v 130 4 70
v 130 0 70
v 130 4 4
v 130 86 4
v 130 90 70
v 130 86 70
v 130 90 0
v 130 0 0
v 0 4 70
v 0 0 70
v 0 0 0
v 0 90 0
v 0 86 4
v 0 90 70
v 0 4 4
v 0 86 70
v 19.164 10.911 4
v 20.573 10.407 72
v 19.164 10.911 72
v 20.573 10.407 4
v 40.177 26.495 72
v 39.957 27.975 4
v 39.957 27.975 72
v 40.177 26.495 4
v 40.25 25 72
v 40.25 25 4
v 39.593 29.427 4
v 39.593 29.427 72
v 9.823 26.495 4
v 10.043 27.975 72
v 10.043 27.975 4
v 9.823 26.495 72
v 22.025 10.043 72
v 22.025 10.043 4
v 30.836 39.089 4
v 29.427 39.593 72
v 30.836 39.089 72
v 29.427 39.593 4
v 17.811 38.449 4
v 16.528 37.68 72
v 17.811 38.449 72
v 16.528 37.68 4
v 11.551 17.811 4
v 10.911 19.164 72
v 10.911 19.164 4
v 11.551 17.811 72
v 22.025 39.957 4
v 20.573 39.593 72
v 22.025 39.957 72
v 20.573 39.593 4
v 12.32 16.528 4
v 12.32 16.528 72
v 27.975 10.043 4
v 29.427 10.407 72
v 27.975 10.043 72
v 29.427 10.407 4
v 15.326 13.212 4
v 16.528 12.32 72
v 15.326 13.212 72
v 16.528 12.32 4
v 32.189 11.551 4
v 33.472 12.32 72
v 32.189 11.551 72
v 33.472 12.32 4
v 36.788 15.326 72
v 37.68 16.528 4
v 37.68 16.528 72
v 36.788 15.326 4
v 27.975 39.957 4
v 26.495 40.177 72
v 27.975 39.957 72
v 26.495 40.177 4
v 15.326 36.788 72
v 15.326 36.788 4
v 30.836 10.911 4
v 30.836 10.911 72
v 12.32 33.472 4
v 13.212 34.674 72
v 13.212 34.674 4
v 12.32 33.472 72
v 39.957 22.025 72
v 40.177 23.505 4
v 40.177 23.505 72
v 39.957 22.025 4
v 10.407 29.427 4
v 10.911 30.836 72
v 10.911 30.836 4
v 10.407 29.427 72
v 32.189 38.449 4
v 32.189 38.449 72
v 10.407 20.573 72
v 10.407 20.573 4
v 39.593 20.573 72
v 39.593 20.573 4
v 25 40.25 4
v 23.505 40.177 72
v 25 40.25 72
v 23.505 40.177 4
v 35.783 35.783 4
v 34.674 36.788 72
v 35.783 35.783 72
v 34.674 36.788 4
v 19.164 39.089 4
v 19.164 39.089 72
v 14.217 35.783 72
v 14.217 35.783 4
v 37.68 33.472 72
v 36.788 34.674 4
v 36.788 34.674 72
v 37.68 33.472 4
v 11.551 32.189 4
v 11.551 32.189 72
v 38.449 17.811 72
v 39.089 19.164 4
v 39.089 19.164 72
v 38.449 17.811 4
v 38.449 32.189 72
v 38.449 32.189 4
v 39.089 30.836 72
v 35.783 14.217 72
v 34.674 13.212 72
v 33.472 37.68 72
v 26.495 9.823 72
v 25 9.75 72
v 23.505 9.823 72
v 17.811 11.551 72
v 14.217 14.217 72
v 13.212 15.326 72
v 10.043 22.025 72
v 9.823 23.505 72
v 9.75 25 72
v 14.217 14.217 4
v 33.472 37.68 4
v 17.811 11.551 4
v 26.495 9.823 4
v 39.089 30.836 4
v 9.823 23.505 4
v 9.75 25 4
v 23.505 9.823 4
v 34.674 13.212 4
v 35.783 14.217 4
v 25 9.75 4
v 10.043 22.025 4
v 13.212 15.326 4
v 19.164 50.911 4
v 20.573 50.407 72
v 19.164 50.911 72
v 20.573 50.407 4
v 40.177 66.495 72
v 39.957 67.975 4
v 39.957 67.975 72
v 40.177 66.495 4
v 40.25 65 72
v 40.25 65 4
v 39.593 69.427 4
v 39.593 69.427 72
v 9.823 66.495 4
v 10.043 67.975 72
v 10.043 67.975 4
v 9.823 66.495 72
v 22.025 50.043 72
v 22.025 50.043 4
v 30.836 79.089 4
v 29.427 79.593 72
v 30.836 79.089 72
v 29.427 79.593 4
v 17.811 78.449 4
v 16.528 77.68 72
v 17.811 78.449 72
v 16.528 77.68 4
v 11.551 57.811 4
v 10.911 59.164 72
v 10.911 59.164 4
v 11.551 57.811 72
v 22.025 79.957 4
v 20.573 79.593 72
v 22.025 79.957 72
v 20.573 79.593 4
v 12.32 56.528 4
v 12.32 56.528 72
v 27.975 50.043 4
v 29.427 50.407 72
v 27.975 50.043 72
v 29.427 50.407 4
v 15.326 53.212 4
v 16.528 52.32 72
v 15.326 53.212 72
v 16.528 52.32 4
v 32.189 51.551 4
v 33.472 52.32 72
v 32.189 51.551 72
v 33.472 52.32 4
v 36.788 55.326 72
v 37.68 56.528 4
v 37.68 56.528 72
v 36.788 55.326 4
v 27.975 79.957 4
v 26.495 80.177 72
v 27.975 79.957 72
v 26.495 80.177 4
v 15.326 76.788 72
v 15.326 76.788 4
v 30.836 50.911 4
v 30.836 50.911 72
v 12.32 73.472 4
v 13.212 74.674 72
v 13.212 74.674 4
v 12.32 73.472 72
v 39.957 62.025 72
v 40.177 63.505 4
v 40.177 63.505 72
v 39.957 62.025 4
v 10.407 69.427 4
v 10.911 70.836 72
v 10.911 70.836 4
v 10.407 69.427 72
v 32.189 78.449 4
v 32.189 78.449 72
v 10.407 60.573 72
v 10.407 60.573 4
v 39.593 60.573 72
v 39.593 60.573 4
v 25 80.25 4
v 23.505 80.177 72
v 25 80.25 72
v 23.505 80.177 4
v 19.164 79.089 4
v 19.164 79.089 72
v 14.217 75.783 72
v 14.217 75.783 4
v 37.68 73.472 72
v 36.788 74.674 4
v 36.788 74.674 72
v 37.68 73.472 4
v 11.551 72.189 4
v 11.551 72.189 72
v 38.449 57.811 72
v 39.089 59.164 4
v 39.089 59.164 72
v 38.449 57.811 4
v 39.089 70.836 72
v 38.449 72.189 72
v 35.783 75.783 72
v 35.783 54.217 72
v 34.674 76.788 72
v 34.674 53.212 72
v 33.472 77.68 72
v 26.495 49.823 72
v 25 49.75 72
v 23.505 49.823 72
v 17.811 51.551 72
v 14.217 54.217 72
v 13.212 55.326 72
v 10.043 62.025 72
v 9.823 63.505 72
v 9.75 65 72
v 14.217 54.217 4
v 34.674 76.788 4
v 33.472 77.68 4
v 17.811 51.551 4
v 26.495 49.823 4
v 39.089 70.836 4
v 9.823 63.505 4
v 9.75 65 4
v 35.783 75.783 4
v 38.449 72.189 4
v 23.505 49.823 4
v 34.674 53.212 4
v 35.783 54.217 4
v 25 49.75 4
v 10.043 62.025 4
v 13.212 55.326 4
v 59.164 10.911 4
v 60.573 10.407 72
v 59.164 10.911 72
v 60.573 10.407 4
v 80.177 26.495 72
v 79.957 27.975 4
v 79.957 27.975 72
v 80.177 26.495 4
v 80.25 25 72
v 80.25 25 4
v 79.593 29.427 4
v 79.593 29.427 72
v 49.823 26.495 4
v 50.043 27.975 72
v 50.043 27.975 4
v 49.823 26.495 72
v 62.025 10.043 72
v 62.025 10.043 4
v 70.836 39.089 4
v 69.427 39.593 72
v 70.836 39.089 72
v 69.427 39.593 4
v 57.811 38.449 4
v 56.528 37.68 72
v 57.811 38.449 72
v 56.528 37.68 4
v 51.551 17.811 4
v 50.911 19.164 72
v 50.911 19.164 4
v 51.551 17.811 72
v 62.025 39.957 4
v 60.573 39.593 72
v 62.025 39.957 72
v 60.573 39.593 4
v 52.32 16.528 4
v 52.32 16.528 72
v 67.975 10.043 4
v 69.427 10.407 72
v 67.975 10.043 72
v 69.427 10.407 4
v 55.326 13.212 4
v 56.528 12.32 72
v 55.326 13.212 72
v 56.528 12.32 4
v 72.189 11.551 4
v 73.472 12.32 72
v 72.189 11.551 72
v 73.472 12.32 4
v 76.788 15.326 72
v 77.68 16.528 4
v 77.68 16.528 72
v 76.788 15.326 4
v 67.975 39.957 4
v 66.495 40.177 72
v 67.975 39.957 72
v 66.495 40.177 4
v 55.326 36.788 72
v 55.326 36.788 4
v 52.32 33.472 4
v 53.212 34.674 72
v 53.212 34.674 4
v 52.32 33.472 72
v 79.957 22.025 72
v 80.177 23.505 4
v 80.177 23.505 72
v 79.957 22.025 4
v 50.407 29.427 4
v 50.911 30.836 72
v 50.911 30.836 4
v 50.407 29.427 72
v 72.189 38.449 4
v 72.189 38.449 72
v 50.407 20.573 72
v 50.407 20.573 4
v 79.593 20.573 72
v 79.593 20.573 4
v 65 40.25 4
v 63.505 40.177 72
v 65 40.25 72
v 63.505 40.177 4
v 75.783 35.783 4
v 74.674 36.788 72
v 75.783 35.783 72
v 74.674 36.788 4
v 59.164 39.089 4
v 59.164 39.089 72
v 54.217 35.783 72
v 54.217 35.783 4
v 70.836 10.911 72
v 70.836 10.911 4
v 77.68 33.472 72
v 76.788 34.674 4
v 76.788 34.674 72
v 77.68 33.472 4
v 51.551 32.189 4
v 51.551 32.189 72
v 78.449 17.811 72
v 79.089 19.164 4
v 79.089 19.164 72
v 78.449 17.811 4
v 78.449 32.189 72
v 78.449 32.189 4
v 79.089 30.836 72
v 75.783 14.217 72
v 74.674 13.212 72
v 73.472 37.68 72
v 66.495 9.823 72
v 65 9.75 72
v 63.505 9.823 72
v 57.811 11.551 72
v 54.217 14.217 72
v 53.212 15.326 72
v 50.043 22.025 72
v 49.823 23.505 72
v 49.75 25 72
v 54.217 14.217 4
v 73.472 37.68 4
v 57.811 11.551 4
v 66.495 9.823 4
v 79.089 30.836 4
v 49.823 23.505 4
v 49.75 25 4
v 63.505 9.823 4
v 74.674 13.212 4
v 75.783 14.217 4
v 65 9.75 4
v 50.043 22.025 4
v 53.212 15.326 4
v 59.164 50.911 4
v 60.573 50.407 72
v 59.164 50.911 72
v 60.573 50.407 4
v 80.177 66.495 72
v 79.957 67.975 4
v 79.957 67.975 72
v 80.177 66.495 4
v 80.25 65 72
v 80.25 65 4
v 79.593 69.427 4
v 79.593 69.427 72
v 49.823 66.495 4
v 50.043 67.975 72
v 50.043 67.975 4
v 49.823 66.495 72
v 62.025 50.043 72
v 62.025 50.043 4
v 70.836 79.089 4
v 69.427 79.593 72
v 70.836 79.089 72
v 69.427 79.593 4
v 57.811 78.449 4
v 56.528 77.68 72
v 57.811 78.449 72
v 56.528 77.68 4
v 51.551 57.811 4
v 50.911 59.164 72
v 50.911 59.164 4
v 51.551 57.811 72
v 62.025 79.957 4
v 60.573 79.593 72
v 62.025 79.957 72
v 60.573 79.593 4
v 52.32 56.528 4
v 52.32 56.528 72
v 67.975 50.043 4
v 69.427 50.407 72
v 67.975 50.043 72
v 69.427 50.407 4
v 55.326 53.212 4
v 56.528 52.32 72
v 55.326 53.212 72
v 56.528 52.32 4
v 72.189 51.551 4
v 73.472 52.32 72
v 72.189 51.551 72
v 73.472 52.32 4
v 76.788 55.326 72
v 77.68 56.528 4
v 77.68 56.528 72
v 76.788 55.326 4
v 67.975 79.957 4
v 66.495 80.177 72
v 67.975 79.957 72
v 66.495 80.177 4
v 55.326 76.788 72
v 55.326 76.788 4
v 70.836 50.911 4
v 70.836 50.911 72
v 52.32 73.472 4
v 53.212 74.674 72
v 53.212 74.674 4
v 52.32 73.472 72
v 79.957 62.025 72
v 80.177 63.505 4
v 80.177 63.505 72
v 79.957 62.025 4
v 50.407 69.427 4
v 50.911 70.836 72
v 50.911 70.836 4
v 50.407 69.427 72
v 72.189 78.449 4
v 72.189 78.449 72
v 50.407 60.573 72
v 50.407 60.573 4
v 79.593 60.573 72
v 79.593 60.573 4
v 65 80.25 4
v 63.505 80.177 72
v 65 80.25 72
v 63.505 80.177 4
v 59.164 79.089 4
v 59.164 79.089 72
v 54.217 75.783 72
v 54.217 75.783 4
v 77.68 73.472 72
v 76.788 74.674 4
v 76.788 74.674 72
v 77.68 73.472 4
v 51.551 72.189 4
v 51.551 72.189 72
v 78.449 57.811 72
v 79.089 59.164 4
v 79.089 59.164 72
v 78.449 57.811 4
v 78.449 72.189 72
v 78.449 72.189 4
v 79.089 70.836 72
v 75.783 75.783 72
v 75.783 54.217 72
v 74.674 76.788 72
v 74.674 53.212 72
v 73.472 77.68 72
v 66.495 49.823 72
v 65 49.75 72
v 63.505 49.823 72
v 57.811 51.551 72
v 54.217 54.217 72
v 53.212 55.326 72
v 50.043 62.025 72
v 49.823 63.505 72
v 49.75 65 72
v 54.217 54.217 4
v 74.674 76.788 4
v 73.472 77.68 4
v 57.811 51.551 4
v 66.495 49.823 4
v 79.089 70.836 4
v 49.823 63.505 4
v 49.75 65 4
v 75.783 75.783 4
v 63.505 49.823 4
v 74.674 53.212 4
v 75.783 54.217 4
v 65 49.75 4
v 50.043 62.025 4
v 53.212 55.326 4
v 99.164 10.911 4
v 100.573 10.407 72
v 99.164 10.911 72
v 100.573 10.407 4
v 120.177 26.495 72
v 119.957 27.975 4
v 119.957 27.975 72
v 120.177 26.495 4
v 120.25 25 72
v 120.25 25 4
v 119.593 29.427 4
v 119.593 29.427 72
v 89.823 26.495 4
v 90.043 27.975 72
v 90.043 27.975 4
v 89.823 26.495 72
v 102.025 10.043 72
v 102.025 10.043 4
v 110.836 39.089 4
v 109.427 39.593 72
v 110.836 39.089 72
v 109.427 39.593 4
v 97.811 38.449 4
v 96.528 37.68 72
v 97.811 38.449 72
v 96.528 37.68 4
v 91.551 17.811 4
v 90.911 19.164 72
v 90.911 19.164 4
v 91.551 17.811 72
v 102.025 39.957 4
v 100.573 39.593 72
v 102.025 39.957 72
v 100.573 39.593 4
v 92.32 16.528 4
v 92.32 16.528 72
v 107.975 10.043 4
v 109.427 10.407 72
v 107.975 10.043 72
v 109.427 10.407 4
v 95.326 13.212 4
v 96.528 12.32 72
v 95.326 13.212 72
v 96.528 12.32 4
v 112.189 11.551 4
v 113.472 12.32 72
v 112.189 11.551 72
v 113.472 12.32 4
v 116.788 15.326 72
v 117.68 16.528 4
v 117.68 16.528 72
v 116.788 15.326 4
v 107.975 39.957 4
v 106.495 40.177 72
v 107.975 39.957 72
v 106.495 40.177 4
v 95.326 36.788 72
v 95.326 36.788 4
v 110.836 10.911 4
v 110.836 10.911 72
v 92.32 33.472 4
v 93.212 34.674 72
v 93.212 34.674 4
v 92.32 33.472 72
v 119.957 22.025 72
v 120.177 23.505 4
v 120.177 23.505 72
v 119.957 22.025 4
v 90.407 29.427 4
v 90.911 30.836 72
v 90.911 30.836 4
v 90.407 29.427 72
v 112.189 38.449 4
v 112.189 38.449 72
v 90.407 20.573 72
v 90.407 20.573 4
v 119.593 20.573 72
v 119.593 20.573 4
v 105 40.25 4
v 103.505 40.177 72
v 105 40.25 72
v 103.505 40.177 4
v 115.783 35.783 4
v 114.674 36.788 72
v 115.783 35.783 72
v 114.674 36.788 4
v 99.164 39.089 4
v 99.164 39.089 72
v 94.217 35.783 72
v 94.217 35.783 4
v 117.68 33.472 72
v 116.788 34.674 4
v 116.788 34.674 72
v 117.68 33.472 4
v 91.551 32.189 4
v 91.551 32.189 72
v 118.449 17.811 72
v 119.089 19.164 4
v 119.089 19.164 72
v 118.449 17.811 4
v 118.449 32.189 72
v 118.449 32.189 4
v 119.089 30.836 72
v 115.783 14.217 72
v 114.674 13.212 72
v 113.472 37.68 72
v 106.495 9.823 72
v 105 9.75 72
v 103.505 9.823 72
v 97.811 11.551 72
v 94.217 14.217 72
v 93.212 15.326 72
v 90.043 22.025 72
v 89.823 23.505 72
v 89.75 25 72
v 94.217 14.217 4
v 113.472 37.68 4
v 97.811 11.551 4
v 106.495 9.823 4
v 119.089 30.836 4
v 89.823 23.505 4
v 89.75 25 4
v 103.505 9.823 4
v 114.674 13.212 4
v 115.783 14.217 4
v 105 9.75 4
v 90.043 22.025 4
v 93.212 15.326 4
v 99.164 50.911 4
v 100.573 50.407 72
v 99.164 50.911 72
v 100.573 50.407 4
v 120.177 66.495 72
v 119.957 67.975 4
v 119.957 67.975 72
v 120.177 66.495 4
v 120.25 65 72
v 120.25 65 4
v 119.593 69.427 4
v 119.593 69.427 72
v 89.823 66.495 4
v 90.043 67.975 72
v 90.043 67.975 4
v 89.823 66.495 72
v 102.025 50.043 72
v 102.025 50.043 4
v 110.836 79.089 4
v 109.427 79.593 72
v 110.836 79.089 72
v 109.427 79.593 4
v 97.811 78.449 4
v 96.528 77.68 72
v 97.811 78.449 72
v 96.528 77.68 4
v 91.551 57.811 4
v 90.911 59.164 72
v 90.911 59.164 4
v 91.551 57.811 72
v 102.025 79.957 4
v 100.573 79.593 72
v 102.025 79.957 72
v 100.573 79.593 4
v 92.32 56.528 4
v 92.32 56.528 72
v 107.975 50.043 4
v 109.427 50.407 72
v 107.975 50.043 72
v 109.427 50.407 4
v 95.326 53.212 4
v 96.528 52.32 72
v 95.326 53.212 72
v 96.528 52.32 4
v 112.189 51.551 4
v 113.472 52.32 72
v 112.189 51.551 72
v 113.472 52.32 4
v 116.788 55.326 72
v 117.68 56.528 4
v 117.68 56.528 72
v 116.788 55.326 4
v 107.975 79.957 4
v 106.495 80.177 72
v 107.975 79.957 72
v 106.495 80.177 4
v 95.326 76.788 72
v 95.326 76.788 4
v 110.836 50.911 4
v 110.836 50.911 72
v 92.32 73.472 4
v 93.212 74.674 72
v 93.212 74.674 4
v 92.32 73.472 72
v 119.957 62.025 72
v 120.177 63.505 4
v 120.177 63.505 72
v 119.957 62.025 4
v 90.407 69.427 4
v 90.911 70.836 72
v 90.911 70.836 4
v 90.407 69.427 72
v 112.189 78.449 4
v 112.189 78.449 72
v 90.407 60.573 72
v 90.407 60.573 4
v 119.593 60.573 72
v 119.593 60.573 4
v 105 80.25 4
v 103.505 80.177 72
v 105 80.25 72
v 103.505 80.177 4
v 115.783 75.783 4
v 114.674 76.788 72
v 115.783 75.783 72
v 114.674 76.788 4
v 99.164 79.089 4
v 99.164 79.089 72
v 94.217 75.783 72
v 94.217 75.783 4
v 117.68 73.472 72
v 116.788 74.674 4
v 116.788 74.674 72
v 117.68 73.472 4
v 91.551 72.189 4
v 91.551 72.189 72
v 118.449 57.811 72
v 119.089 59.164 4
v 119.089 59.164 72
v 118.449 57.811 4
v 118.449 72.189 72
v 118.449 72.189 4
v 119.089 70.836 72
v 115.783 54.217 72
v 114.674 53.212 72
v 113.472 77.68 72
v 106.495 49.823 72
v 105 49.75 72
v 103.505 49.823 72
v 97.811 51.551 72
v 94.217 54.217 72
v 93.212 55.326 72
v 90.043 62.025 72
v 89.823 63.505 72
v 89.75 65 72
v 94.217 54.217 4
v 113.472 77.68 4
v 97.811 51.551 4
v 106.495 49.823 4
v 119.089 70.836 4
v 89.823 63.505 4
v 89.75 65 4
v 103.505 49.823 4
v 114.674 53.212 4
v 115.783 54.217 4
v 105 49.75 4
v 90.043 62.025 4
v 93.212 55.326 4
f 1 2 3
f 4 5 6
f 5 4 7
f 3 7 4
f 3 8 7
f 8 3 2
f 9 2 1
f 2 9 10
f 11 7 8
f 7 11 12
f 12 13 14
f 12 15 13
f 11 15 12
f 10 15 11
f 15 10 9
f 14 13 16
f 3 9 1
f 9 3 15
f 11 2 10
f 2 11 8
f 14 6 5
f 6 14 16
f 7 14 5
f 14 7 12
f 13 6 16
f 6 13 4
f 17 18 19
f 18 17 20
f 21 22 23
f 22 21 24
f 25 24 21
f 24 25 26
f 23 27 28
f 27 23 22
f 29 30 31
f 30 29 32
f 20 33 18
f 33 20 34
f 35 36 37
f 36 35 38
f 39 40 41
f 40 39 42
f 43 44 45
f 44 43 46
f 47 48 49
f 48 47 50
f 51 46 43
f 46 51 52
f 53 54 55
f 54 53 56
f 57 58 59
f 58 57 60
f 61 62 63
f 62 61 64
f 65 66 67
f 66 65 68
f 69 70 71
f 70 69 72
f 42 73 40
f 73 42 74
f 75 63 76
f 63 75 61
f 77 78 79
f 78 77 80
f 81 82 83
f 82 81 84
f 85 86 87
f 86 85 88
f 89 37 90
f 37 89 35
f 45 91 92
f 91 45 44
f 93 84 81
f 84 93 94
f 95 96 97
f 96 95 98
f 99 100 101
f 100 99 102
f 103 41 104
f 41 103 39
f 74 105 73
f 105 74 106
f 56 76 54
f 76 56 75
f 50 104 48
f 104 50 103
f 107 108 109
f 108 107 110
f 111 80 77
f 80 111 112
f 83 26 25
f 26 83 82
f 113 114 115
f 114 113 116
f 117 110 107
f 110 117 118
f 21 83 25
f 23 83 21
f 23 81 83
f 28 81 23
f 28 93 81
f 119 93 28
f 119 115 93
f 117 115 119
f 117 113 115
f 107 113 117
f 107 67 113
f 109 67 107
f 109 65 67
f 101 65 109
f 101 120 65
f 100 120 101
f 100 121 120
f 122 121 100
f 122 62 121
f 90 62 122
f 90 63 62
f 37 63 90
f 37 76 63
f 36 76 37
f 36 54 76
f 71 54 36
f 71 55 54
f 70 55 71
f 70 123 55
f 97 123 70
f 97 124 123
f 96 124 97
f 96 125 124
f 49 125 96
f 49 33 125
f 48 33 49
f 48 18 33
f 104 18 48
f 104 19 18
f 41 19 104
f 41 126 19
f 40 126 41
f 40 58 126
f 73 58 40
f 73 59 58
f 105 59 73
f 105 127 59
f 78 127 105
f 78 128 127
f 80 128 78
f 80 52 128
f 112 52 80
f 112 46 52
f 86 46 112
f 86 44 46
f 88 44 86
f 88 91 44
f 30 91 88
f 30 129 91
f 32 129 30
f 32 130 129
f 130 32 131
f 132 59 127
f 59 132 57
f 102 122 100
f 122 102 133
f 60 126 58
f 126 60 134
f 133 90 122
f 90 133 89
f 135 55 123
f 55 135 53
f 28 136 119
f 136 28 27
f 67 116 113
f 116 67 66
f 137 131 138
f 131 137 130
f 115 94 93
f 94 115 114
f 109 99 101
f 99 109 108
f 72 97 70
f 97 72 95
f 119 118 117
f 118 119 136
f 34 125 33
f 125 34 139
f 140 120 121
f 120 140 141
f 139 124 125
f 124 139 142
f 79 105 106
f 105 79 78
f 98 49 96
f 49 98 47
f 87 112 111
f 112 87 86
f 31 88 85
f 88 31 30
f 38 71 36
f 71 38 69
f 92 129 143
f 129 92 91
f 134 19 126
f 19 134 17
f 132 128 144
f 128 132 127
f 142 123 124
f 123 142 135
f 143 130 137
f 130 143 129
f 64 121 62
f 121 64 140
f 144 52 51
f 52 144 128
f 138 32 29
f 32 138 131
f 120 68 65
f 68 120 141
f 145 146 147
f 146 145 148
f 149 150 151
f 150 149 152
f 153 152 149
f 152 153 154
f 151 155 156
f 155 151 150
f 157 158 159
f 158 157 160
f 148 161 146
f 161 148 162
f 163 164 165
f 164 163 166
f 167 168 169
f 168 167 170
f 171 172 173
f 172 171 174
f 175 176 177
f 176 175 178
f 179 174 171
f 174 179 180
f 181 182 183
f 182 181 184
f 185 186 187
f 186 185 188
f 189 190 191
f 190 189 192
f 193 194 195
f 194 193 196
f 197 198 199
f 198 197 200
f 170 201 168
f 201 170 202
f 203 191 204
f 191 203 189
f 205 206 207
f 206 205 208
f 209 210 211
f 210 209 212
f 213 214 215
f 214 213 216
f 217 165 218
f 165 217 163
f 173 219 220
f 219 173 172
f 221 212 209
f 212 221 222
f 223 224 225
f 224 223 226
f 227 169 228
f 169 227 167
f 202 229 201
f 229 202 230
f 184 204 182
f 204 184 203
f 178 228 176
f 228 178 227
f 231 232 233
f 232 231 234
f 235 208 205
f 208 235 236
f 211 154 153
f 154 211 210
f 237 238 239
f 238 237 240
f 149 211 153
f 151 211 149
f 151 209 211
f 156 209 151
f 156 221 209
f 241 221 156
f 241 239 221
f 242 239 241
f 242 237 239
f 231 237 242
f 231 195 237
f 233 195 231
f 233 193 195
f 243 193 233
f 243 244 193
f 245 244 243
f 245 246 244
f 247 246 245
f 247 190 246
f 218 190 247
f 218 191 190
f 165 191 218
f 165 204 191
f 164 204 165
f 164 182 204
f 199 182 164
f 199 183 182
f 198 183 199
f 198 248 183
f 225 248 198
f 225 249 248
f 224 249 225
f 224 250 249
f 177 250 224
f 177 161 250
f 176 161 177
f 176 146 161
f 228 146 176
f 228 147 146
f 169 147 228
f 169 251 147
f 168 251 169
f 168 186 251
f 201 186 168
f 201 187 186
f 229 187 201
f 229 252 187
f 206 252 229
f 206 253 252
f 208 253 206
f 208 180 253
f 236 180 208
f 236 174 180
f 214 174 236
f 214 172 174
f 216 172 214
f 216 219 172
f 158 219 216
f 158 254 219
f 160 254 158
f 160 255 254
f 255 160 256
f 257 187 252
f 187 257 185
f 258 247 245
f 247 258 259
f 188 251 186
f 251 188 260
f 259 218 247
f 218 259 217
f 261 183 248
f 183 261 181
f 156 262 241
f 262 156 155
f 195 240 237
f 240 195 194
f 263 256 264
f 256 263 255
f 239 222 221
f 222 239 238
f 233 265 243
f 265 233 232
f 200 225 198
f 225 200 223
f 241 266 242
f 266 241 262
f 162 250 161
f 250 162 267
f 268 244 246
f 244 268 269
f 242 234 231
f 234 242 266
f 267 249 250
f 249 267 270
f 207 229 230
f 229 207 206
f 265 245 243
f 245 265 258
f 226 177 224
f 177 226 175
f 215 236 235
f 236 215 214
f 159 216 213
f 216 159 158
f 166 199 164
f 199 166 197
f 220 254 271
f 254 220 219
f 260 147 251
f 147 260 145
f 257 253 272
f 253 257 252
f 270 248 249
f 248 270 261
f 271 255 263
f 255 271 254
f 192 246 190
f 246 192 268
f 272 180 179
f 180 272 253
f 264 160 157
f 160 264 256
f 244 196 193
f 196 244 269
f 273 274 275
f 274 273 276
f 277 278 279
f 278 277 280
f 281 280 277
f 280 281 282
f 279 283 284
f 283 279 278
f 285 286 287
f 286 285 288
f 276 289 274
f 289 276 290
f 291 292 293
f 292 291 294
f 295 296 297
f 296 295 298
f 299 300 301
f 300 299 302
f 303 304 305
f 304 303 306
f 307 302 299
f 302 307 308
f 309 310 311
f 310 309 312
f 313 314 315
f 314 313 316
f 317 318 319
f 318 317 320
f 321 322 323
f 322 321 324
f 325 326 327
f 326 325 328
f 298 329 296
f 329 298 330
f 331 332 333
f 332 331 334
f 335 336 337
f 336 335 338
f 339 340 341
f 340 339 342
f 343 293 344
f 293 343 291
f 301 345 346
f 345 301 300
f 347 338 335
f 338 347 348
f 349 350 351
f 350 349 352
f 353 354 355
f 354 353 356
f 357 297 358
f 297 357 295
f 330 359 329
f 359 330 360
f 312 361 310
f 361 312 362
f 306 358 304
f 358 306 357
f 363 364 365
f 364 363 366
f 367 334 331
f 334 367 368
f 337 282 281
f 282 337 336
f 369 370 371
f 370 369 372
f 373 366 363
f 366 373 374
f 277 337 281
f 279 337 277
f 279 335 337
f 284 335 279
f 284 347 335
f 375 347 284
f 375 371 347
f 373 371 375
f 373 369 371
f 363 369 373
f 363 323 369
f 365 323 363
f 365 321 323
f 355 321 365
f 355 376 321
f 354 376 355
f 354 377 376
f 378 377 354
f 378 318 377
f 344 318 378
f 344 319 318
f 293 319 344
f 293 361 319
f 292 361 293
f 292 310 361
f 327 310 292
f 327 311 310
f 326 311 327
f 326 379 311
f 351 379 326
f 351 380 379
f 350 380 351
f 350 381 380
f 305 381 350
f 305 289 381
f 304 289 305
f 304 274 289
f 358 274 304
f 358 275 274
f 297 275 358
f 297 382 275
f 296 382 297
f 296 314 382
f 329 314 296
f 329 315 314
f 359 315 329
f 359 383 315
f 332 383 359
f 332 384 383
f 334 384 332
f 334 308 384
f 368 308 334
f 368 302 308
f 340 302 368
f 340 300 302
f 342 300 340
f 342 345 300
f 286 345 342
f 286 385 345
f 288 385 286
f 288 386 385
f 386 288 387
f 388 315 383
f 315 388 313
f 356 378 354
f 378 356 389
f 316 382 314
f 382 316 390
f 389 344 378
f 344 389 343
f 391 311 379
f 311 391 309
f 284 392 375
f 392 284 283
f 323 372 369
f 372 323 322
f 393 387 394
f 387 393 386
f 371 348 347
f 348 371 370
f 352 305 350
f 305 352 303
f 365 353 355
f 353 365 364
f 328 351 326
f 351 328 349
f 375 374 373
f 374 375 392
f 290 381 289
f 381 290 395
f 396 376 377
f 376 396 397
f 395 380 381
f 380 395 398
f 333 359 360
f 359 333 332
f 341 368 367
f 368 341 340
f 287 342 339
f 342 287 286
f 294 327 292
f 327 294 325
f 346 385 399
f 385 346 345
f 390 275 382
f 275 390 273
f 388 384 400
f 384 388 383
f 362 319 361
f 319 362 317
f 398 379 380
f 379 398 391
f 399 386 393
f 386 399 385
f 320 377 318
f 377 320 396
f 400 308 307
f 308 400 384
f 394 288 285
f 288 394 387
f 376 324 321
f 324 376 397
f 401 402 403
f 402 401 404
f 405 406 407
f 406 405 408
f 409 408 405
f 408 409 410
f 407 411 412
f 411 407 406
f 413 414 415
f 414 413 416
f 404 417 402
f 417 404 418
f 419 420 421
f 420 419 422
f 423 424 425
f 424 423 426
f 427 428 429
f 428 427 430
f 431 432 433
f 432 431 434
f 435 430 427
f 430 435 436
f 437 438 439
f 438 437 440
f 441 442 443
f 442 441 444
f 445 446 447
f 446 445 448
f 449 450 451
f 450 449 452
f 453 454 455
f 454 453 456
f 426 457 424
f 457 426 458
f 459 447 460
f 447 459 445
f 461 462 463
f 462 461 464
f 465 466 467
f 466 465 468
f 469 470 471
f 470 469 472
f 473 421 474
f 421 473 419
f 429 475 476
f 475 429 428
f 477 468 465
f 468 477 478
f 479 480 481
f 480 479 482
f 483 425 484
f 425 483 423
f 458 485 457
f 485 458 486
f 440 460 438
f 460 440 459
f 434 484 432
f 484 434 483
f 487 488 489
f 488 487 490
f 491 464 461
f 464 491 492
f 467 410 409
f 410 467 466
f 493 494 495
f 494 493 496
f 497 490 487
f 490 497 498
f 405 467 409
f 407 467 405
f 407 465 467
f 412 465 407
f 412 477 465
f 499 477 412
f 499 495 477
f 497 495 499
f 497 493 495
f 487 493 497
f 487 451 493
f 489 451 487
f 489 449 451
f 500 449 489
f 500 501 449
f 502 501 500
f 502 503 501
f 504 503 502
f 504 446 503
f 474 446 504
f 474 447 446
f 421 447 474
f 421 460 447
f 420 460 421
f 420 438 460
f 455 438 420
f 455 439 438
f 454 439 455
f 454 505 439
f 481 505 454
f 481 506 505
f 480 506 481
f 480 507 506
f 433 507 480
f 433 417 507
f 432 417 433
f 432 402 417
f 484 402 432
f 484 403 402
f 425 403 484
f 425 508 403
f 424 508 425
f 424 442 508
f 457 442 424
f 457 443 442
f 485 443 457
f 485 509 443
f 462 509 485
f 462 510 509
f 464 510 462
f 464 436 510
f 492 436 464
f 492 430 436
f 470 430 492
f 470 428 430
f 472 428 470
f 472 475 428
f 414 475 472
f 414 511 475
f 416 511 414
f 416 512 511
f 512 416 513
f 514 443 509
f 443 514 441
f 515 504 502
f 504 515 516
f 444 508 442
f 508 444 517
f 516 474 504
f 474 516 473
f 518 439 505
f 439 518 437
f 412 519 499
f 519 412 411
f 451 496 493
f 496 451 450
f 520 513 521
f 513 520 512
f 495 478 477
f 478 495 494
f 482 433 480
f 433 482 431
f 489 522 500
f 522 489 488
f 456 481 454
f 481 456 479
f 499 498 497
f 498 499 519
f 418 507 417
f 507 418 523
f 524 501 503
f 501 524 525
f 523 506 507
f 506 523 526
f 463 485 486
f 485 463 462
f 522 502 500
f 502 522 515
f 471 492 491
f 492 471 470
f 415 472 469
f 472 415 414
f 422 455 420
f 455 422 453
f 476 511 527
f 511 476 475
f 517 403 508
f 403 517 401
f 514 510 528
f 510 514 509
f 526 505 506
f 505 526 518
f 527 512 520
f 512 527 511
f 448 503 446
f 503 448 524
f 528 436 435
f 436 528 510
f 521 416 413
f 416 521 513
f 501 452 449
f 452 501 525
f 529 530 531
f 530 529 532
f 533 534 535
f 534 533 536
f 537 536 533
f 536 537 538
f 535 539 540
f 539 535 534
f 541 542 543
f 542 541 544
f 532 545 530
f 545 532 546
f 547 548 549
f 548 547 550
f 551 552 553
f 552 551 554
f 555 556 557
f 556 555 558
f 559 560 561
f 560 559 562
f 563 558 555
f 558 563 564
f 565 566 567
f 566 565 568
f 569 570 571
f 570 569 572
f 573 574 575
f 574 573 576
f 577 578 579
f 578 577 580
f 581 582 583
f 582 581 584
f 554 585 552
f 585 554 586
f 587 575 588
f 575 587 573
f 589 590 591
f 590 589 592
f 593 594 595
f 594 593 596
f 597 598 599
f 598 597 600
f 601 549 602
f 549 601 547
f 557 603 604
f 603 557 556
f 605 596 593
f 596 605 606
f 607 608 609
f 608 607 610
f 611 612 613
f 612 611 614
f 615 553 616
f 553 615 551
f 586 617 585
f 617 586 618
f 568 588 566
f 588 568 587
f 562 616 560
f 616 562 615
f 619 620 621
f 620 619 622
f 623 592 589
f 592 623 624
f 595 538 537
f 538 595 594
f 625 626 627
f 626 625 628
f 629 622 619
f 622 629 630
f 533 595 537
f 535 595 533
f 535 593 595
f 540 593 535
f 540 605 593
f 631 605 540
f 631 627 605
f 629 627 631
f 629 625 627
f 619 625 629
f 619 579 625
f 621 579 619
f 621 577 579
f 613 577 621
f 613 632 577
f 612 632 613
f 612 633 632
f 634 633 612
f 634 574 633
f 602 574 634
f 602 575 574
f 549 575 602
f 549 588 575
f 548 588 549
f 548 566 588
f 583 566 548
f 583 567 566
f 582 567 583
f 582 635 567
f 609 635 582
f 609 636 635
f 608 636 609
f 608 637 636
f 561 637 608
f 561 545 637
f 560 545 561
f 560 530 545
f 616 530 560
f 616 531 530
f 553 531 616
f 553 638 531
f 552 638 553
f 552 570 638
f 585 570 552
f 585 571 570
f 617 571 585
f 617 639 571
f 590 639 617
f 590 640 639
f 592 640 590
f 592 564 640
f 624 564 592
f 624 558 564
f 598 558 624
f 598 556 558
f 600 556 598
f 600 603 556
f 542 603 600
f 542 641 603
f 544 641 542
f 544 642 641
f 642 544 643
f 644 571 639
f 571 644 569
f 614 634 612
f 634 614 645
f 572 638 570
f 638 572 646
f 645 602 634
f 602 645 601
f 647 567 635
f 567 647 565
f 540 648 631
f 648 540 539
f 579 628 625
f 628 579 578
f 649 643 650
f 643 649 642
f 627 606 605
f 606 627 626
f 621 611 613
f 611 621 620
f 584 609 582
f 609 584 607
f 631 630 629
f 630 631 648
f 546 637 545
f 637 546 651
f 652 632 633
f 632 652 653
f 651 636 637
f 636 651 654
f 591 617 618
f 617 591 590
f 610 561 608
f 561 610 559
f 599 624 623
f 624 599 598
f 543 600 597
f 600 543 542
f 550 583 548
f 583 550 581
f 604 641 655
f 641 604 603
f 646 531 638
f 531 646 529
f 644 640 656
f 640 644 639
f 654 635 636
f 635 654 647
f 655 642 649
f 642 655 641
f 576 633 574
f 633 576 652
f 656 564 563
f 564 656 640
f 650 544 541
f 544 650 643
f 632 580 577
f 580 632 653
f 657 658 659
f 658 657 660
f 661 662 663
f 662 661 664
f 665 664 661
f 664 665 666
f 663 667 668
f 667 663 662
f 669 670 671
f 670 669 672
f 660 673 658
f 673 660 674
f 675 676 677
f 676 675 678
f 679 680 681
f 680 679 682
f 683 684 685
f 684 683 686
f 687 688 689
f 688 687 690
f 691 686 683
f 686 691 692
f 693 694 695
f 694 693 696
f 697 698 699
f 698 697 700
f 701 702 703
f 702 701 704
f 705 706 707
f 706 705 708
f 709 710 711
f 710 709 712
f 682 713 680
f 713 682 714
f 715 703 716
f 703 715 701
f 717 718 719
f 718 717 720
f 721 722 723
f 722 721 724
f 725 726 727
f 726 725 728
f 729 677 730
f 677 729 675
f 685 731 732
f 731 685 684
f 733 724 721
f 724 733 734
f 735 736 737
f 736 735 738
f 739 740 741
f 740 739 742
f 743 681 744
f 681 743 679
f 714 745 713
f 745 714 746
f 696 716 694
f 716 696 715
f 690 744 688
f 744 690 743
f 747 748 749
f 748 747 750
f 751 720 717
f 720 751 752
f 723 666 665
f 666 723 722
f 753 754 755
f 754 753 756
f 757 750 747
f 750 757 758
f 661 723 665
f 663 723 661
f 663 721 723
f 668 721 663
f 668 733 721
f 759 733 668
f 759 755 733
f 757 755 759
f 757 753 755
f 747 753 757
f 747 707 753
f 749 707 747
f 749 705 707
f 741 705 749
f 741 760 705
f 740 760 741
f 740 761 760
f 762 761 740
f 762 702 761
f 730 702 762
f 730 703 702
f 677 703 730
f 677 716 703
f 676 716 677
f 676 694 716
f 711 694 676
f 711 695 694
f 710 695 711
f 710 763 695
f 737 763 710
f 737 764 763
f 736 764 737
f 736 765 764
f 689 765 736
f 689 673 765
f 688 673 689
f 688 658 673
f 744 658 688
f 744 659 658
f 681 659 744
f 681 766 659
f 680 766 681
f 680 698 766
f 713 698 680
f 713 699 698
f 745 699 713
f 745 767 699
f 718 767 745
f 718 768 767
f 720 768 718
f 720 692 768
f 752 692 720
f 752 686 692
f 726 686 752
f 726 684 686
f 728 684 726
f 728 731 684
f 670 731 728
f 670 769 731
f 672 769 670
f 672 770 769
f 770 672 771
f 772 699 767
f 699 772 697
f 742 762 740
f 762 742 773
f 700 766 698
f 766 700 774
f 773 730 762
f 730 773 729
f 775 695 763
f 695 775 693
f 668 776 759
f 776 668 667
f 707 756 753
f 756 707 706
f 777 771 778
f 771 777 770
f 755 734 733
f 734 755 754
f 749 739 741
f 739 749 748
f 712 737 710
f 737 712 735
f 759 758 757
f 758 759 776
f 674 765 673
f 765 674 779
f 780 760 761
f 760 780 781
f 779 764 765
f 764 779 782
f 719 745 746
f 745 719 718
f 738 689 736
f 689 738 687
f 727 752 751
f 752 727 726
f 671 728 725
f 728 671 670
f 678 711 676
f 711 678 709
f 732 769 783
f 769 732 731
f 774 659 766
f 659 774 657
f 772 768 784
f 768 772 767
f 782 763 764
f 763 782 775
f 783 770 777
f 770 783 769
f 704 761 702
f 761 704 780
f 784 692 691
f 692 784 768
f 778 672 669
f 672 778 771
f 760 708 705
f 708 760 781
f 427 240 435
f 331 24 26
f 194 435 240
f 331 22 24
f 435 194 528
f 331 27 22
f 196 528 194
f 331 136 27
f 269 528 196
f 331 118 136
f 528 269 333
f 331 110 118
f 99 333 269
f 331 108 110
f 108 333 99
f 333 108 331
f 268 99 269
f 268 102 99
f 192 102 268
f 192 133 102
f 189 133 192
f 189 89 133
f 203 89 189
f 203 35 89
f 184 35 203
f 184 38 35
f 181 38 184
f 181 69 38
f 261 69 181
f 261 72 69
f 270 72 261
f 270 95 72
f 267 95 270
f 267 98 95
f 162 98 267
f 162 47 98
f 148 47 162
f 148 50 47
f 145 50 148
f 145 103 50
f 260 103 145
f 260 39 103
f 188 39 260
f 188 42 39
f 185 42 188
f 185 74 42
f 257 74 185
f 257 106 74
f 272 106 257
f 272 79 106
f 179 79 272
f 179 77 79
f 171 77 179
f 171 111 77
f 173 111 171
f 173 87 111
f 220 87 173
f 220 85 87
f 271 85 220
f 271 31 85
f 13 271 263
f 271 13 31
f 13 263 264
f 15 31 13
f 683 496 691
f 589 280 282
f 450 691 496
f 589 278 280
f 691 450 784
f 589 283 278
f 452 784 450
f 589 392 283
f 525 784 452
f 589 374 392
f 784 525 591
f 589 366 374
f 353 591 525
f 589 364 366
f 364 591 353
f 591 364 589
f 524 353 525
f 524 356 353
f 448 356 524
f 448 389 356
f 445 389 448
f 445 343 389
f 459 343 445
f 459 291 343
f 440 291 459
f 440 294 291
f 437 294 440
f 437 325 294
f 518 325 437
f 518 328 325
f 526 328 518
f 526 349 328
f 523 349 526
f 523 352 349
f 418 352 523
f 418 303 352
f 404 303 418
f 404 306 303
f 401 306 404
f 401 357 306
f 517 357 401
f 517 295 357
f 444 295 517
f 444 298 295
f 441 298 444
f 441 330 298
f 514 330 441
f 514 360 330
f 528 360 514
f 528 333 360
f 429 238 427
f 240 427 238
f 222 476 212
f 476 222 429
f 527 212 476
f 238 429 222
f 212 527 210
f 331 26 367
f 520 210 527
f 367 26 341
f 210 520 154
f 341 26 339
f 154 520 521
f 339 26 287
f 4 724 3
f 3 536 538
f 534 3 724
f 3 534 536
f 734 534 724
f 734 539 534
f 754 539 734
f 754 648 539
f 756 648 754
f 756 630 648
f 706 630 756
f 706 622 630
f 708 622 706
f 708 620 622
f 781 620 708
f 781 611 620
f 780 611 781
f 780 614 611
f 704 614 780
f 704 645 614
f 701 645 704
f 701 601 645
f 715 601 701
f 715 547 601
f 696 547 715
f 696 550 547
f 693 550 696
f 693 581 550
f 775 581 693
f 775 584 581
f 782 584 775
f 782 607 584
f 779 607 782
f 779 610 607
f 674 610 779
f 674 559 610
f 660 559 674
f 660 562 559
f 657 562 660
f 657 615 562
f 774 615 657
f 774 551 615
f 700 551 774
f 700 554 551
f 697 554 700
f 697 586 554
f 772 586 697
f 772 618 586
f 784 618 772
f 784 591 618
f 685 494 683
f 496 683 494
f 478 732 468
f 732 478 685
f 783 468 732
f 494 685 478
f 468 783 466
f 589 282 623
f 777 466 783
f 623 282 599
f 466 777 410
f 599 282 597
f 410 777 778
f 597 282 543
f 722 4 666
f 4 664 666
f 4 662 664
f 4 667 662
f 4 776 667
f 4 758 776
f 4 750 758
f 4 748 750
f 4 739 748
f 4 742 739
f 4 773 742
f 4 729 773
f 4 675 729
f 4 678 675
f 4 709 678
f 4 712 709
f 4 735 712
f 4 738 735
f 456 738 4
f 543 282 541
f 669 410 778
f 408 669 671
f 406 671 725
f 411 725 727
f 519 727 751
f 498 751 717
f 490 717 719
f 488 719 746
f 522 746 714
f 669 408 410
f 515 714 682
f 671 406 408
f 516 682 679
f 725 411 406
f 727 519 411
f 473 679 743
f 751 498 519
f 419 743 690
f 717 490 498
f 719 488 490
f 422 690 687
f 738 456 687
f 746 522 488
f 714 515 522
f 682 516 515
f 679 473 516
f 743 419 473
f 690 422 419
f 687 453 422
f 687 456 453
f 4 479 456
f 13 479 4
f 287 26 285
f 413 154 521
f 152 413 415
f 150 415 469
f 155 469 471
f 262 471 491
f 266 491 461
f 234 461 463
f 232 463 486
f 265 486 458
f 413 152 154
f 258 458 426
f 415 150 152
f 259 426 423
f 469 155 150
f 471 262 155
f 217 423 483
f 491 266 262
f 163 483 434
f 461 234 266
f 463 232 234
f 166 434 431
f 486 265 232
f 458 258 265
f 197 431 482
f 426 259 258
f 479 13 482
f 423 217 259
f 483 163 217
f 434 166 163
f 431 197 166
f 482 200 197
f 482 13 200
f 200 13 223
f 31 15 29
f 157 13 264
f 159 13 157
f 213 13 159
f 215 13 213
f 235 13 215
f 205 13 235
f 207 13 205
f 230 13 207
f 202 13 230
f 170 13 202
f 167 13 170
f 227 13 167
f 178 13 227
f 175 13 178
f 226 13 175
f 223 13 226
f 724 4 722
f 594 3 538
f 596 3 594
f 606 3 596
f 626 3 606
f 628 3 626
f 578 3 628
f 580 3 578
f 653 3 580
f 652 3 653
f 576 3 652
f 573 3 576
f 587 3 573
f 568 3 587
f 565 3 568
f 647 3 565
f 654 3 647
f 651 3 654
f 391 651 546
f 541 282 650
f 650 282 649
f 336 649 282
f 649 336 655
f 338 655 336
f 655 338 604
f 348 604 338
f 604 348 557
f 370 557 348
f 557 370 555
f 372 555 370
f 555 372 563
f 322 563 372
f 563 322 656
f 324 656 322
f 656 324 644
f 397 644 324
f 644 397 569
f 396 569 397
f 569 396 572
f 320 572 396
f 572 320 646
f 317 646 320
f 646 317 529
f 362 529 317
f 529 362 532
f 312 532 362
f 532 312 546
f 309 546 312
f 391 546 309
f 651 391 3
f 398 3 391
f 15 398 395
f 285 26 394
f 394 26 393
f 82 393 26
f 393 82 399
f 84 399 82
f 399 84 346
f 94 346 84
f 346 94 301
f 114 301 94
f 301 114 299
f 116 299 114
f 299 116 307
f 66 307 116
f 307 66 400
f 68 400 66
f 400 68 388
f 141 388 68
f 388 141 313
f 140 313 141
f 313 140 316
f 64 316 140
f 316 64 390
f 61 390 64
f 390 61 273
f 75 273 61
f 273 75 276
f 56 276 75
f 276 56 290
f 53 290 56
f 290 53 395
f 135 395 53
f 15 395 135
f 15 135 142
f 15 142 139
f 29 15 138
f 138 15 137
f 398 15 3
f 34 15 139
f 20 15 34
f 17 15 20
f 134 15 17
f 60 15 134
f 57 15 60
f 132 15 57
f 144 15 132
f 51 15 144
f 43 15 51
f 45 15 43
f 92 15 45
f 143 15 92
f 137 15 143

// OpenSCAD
// Rack for six 50 mL conical (Falcon-type) tubes
// Print orientation: Upside down. Flat plate on bed (Z=0).
// After printing, flip over to stand on the two side walls.

// --- Dimensions ---
// Plate dimensions
$plate_length = 130; // X
$plate_width = 90;   // Y
$plate_thickness = 4; // Z

// Hole specifications
$hole_diameter = 30.5;
$hole_spacing_x = 40; // Centre-to-centre along X
$hole_spacing_y = 40; // Centre-to-centre along Y

// Wall specifications
$wall_length = 130;   // X
$wall_thickness = 4;  // Y
$wall_height = 70;    // Z (total height from bed)

// --- Configuration ---
$fn = 64; // Smooth curves for holes

// --- Calculations ---
// Hole positions (3 rows along X, 2 rows along Y)
// X positions: 3 holes, 40mm spacing. Total span = 80mm.
// Plate width = 130mm. Margin = (130 - 80) / 2 = 25mm.
// Positions: 25, 65, 105.
$hole_x_positions = [25, 65, 105];

// Y positions: 2 holes, 40mm spacing. Total span = 40mm.
// Plate height = 90mm. Margin = (90 - 40) / 2 = 25mm.
// Positions: 25, 65.
$hole_y_positions = [25, 65];

// Wall positions (along long edges, Y = 0 and Y = 90)
// Walls are 4mm thick.
// Wall 1: Y 0 to 4.
// Wall 2: Y 86 to 90.
$wall_y_positions = [0, $plate_width - $wall_thickness];

// --- Main Module ---
module tube_rack() {
    union() {
        // 1. The Base Plate
        // Dimensions: 130 x 90 x 4
        translate([0, 0, 0])
            cube([$plate_length, $plate_width, $plate_thickness]);

        // 2. The Side Walls
        // They rise from the plate (Z=0) to Z=70.
        // They are 4mm thick in Y, 130mm long in X.
        // Position 1: Y = 0 (Left edge)
        // Position 2: Y = 86 (Right edge, 90-4)
        for (y_pos = $wall_y_positions) {
            translate([0, y_pos, 0])
                cube([$wall_length, $wall_thickness, $wall_height]);
        }

        // 3. The Through-Holes
        // We subtract cylinders from the union of plate and walls.
        // Cylinder height must be > wall_height to ensure clean cut through the top.
        $cut_height = $wall_height + 2; 
        
        for (x_pos = $hole_x_positions) {
            for (y_pos = $hole_y_positions) {
                translate([x_pos, y_pos, 0])
                    cylinder(
                        h = $cut_height,
                        d = $hole_diameter,
                        center = false // Starts at Z=0, goes up
                    );
            }
        }
    }
}

// Generate the part
tube_rack();
